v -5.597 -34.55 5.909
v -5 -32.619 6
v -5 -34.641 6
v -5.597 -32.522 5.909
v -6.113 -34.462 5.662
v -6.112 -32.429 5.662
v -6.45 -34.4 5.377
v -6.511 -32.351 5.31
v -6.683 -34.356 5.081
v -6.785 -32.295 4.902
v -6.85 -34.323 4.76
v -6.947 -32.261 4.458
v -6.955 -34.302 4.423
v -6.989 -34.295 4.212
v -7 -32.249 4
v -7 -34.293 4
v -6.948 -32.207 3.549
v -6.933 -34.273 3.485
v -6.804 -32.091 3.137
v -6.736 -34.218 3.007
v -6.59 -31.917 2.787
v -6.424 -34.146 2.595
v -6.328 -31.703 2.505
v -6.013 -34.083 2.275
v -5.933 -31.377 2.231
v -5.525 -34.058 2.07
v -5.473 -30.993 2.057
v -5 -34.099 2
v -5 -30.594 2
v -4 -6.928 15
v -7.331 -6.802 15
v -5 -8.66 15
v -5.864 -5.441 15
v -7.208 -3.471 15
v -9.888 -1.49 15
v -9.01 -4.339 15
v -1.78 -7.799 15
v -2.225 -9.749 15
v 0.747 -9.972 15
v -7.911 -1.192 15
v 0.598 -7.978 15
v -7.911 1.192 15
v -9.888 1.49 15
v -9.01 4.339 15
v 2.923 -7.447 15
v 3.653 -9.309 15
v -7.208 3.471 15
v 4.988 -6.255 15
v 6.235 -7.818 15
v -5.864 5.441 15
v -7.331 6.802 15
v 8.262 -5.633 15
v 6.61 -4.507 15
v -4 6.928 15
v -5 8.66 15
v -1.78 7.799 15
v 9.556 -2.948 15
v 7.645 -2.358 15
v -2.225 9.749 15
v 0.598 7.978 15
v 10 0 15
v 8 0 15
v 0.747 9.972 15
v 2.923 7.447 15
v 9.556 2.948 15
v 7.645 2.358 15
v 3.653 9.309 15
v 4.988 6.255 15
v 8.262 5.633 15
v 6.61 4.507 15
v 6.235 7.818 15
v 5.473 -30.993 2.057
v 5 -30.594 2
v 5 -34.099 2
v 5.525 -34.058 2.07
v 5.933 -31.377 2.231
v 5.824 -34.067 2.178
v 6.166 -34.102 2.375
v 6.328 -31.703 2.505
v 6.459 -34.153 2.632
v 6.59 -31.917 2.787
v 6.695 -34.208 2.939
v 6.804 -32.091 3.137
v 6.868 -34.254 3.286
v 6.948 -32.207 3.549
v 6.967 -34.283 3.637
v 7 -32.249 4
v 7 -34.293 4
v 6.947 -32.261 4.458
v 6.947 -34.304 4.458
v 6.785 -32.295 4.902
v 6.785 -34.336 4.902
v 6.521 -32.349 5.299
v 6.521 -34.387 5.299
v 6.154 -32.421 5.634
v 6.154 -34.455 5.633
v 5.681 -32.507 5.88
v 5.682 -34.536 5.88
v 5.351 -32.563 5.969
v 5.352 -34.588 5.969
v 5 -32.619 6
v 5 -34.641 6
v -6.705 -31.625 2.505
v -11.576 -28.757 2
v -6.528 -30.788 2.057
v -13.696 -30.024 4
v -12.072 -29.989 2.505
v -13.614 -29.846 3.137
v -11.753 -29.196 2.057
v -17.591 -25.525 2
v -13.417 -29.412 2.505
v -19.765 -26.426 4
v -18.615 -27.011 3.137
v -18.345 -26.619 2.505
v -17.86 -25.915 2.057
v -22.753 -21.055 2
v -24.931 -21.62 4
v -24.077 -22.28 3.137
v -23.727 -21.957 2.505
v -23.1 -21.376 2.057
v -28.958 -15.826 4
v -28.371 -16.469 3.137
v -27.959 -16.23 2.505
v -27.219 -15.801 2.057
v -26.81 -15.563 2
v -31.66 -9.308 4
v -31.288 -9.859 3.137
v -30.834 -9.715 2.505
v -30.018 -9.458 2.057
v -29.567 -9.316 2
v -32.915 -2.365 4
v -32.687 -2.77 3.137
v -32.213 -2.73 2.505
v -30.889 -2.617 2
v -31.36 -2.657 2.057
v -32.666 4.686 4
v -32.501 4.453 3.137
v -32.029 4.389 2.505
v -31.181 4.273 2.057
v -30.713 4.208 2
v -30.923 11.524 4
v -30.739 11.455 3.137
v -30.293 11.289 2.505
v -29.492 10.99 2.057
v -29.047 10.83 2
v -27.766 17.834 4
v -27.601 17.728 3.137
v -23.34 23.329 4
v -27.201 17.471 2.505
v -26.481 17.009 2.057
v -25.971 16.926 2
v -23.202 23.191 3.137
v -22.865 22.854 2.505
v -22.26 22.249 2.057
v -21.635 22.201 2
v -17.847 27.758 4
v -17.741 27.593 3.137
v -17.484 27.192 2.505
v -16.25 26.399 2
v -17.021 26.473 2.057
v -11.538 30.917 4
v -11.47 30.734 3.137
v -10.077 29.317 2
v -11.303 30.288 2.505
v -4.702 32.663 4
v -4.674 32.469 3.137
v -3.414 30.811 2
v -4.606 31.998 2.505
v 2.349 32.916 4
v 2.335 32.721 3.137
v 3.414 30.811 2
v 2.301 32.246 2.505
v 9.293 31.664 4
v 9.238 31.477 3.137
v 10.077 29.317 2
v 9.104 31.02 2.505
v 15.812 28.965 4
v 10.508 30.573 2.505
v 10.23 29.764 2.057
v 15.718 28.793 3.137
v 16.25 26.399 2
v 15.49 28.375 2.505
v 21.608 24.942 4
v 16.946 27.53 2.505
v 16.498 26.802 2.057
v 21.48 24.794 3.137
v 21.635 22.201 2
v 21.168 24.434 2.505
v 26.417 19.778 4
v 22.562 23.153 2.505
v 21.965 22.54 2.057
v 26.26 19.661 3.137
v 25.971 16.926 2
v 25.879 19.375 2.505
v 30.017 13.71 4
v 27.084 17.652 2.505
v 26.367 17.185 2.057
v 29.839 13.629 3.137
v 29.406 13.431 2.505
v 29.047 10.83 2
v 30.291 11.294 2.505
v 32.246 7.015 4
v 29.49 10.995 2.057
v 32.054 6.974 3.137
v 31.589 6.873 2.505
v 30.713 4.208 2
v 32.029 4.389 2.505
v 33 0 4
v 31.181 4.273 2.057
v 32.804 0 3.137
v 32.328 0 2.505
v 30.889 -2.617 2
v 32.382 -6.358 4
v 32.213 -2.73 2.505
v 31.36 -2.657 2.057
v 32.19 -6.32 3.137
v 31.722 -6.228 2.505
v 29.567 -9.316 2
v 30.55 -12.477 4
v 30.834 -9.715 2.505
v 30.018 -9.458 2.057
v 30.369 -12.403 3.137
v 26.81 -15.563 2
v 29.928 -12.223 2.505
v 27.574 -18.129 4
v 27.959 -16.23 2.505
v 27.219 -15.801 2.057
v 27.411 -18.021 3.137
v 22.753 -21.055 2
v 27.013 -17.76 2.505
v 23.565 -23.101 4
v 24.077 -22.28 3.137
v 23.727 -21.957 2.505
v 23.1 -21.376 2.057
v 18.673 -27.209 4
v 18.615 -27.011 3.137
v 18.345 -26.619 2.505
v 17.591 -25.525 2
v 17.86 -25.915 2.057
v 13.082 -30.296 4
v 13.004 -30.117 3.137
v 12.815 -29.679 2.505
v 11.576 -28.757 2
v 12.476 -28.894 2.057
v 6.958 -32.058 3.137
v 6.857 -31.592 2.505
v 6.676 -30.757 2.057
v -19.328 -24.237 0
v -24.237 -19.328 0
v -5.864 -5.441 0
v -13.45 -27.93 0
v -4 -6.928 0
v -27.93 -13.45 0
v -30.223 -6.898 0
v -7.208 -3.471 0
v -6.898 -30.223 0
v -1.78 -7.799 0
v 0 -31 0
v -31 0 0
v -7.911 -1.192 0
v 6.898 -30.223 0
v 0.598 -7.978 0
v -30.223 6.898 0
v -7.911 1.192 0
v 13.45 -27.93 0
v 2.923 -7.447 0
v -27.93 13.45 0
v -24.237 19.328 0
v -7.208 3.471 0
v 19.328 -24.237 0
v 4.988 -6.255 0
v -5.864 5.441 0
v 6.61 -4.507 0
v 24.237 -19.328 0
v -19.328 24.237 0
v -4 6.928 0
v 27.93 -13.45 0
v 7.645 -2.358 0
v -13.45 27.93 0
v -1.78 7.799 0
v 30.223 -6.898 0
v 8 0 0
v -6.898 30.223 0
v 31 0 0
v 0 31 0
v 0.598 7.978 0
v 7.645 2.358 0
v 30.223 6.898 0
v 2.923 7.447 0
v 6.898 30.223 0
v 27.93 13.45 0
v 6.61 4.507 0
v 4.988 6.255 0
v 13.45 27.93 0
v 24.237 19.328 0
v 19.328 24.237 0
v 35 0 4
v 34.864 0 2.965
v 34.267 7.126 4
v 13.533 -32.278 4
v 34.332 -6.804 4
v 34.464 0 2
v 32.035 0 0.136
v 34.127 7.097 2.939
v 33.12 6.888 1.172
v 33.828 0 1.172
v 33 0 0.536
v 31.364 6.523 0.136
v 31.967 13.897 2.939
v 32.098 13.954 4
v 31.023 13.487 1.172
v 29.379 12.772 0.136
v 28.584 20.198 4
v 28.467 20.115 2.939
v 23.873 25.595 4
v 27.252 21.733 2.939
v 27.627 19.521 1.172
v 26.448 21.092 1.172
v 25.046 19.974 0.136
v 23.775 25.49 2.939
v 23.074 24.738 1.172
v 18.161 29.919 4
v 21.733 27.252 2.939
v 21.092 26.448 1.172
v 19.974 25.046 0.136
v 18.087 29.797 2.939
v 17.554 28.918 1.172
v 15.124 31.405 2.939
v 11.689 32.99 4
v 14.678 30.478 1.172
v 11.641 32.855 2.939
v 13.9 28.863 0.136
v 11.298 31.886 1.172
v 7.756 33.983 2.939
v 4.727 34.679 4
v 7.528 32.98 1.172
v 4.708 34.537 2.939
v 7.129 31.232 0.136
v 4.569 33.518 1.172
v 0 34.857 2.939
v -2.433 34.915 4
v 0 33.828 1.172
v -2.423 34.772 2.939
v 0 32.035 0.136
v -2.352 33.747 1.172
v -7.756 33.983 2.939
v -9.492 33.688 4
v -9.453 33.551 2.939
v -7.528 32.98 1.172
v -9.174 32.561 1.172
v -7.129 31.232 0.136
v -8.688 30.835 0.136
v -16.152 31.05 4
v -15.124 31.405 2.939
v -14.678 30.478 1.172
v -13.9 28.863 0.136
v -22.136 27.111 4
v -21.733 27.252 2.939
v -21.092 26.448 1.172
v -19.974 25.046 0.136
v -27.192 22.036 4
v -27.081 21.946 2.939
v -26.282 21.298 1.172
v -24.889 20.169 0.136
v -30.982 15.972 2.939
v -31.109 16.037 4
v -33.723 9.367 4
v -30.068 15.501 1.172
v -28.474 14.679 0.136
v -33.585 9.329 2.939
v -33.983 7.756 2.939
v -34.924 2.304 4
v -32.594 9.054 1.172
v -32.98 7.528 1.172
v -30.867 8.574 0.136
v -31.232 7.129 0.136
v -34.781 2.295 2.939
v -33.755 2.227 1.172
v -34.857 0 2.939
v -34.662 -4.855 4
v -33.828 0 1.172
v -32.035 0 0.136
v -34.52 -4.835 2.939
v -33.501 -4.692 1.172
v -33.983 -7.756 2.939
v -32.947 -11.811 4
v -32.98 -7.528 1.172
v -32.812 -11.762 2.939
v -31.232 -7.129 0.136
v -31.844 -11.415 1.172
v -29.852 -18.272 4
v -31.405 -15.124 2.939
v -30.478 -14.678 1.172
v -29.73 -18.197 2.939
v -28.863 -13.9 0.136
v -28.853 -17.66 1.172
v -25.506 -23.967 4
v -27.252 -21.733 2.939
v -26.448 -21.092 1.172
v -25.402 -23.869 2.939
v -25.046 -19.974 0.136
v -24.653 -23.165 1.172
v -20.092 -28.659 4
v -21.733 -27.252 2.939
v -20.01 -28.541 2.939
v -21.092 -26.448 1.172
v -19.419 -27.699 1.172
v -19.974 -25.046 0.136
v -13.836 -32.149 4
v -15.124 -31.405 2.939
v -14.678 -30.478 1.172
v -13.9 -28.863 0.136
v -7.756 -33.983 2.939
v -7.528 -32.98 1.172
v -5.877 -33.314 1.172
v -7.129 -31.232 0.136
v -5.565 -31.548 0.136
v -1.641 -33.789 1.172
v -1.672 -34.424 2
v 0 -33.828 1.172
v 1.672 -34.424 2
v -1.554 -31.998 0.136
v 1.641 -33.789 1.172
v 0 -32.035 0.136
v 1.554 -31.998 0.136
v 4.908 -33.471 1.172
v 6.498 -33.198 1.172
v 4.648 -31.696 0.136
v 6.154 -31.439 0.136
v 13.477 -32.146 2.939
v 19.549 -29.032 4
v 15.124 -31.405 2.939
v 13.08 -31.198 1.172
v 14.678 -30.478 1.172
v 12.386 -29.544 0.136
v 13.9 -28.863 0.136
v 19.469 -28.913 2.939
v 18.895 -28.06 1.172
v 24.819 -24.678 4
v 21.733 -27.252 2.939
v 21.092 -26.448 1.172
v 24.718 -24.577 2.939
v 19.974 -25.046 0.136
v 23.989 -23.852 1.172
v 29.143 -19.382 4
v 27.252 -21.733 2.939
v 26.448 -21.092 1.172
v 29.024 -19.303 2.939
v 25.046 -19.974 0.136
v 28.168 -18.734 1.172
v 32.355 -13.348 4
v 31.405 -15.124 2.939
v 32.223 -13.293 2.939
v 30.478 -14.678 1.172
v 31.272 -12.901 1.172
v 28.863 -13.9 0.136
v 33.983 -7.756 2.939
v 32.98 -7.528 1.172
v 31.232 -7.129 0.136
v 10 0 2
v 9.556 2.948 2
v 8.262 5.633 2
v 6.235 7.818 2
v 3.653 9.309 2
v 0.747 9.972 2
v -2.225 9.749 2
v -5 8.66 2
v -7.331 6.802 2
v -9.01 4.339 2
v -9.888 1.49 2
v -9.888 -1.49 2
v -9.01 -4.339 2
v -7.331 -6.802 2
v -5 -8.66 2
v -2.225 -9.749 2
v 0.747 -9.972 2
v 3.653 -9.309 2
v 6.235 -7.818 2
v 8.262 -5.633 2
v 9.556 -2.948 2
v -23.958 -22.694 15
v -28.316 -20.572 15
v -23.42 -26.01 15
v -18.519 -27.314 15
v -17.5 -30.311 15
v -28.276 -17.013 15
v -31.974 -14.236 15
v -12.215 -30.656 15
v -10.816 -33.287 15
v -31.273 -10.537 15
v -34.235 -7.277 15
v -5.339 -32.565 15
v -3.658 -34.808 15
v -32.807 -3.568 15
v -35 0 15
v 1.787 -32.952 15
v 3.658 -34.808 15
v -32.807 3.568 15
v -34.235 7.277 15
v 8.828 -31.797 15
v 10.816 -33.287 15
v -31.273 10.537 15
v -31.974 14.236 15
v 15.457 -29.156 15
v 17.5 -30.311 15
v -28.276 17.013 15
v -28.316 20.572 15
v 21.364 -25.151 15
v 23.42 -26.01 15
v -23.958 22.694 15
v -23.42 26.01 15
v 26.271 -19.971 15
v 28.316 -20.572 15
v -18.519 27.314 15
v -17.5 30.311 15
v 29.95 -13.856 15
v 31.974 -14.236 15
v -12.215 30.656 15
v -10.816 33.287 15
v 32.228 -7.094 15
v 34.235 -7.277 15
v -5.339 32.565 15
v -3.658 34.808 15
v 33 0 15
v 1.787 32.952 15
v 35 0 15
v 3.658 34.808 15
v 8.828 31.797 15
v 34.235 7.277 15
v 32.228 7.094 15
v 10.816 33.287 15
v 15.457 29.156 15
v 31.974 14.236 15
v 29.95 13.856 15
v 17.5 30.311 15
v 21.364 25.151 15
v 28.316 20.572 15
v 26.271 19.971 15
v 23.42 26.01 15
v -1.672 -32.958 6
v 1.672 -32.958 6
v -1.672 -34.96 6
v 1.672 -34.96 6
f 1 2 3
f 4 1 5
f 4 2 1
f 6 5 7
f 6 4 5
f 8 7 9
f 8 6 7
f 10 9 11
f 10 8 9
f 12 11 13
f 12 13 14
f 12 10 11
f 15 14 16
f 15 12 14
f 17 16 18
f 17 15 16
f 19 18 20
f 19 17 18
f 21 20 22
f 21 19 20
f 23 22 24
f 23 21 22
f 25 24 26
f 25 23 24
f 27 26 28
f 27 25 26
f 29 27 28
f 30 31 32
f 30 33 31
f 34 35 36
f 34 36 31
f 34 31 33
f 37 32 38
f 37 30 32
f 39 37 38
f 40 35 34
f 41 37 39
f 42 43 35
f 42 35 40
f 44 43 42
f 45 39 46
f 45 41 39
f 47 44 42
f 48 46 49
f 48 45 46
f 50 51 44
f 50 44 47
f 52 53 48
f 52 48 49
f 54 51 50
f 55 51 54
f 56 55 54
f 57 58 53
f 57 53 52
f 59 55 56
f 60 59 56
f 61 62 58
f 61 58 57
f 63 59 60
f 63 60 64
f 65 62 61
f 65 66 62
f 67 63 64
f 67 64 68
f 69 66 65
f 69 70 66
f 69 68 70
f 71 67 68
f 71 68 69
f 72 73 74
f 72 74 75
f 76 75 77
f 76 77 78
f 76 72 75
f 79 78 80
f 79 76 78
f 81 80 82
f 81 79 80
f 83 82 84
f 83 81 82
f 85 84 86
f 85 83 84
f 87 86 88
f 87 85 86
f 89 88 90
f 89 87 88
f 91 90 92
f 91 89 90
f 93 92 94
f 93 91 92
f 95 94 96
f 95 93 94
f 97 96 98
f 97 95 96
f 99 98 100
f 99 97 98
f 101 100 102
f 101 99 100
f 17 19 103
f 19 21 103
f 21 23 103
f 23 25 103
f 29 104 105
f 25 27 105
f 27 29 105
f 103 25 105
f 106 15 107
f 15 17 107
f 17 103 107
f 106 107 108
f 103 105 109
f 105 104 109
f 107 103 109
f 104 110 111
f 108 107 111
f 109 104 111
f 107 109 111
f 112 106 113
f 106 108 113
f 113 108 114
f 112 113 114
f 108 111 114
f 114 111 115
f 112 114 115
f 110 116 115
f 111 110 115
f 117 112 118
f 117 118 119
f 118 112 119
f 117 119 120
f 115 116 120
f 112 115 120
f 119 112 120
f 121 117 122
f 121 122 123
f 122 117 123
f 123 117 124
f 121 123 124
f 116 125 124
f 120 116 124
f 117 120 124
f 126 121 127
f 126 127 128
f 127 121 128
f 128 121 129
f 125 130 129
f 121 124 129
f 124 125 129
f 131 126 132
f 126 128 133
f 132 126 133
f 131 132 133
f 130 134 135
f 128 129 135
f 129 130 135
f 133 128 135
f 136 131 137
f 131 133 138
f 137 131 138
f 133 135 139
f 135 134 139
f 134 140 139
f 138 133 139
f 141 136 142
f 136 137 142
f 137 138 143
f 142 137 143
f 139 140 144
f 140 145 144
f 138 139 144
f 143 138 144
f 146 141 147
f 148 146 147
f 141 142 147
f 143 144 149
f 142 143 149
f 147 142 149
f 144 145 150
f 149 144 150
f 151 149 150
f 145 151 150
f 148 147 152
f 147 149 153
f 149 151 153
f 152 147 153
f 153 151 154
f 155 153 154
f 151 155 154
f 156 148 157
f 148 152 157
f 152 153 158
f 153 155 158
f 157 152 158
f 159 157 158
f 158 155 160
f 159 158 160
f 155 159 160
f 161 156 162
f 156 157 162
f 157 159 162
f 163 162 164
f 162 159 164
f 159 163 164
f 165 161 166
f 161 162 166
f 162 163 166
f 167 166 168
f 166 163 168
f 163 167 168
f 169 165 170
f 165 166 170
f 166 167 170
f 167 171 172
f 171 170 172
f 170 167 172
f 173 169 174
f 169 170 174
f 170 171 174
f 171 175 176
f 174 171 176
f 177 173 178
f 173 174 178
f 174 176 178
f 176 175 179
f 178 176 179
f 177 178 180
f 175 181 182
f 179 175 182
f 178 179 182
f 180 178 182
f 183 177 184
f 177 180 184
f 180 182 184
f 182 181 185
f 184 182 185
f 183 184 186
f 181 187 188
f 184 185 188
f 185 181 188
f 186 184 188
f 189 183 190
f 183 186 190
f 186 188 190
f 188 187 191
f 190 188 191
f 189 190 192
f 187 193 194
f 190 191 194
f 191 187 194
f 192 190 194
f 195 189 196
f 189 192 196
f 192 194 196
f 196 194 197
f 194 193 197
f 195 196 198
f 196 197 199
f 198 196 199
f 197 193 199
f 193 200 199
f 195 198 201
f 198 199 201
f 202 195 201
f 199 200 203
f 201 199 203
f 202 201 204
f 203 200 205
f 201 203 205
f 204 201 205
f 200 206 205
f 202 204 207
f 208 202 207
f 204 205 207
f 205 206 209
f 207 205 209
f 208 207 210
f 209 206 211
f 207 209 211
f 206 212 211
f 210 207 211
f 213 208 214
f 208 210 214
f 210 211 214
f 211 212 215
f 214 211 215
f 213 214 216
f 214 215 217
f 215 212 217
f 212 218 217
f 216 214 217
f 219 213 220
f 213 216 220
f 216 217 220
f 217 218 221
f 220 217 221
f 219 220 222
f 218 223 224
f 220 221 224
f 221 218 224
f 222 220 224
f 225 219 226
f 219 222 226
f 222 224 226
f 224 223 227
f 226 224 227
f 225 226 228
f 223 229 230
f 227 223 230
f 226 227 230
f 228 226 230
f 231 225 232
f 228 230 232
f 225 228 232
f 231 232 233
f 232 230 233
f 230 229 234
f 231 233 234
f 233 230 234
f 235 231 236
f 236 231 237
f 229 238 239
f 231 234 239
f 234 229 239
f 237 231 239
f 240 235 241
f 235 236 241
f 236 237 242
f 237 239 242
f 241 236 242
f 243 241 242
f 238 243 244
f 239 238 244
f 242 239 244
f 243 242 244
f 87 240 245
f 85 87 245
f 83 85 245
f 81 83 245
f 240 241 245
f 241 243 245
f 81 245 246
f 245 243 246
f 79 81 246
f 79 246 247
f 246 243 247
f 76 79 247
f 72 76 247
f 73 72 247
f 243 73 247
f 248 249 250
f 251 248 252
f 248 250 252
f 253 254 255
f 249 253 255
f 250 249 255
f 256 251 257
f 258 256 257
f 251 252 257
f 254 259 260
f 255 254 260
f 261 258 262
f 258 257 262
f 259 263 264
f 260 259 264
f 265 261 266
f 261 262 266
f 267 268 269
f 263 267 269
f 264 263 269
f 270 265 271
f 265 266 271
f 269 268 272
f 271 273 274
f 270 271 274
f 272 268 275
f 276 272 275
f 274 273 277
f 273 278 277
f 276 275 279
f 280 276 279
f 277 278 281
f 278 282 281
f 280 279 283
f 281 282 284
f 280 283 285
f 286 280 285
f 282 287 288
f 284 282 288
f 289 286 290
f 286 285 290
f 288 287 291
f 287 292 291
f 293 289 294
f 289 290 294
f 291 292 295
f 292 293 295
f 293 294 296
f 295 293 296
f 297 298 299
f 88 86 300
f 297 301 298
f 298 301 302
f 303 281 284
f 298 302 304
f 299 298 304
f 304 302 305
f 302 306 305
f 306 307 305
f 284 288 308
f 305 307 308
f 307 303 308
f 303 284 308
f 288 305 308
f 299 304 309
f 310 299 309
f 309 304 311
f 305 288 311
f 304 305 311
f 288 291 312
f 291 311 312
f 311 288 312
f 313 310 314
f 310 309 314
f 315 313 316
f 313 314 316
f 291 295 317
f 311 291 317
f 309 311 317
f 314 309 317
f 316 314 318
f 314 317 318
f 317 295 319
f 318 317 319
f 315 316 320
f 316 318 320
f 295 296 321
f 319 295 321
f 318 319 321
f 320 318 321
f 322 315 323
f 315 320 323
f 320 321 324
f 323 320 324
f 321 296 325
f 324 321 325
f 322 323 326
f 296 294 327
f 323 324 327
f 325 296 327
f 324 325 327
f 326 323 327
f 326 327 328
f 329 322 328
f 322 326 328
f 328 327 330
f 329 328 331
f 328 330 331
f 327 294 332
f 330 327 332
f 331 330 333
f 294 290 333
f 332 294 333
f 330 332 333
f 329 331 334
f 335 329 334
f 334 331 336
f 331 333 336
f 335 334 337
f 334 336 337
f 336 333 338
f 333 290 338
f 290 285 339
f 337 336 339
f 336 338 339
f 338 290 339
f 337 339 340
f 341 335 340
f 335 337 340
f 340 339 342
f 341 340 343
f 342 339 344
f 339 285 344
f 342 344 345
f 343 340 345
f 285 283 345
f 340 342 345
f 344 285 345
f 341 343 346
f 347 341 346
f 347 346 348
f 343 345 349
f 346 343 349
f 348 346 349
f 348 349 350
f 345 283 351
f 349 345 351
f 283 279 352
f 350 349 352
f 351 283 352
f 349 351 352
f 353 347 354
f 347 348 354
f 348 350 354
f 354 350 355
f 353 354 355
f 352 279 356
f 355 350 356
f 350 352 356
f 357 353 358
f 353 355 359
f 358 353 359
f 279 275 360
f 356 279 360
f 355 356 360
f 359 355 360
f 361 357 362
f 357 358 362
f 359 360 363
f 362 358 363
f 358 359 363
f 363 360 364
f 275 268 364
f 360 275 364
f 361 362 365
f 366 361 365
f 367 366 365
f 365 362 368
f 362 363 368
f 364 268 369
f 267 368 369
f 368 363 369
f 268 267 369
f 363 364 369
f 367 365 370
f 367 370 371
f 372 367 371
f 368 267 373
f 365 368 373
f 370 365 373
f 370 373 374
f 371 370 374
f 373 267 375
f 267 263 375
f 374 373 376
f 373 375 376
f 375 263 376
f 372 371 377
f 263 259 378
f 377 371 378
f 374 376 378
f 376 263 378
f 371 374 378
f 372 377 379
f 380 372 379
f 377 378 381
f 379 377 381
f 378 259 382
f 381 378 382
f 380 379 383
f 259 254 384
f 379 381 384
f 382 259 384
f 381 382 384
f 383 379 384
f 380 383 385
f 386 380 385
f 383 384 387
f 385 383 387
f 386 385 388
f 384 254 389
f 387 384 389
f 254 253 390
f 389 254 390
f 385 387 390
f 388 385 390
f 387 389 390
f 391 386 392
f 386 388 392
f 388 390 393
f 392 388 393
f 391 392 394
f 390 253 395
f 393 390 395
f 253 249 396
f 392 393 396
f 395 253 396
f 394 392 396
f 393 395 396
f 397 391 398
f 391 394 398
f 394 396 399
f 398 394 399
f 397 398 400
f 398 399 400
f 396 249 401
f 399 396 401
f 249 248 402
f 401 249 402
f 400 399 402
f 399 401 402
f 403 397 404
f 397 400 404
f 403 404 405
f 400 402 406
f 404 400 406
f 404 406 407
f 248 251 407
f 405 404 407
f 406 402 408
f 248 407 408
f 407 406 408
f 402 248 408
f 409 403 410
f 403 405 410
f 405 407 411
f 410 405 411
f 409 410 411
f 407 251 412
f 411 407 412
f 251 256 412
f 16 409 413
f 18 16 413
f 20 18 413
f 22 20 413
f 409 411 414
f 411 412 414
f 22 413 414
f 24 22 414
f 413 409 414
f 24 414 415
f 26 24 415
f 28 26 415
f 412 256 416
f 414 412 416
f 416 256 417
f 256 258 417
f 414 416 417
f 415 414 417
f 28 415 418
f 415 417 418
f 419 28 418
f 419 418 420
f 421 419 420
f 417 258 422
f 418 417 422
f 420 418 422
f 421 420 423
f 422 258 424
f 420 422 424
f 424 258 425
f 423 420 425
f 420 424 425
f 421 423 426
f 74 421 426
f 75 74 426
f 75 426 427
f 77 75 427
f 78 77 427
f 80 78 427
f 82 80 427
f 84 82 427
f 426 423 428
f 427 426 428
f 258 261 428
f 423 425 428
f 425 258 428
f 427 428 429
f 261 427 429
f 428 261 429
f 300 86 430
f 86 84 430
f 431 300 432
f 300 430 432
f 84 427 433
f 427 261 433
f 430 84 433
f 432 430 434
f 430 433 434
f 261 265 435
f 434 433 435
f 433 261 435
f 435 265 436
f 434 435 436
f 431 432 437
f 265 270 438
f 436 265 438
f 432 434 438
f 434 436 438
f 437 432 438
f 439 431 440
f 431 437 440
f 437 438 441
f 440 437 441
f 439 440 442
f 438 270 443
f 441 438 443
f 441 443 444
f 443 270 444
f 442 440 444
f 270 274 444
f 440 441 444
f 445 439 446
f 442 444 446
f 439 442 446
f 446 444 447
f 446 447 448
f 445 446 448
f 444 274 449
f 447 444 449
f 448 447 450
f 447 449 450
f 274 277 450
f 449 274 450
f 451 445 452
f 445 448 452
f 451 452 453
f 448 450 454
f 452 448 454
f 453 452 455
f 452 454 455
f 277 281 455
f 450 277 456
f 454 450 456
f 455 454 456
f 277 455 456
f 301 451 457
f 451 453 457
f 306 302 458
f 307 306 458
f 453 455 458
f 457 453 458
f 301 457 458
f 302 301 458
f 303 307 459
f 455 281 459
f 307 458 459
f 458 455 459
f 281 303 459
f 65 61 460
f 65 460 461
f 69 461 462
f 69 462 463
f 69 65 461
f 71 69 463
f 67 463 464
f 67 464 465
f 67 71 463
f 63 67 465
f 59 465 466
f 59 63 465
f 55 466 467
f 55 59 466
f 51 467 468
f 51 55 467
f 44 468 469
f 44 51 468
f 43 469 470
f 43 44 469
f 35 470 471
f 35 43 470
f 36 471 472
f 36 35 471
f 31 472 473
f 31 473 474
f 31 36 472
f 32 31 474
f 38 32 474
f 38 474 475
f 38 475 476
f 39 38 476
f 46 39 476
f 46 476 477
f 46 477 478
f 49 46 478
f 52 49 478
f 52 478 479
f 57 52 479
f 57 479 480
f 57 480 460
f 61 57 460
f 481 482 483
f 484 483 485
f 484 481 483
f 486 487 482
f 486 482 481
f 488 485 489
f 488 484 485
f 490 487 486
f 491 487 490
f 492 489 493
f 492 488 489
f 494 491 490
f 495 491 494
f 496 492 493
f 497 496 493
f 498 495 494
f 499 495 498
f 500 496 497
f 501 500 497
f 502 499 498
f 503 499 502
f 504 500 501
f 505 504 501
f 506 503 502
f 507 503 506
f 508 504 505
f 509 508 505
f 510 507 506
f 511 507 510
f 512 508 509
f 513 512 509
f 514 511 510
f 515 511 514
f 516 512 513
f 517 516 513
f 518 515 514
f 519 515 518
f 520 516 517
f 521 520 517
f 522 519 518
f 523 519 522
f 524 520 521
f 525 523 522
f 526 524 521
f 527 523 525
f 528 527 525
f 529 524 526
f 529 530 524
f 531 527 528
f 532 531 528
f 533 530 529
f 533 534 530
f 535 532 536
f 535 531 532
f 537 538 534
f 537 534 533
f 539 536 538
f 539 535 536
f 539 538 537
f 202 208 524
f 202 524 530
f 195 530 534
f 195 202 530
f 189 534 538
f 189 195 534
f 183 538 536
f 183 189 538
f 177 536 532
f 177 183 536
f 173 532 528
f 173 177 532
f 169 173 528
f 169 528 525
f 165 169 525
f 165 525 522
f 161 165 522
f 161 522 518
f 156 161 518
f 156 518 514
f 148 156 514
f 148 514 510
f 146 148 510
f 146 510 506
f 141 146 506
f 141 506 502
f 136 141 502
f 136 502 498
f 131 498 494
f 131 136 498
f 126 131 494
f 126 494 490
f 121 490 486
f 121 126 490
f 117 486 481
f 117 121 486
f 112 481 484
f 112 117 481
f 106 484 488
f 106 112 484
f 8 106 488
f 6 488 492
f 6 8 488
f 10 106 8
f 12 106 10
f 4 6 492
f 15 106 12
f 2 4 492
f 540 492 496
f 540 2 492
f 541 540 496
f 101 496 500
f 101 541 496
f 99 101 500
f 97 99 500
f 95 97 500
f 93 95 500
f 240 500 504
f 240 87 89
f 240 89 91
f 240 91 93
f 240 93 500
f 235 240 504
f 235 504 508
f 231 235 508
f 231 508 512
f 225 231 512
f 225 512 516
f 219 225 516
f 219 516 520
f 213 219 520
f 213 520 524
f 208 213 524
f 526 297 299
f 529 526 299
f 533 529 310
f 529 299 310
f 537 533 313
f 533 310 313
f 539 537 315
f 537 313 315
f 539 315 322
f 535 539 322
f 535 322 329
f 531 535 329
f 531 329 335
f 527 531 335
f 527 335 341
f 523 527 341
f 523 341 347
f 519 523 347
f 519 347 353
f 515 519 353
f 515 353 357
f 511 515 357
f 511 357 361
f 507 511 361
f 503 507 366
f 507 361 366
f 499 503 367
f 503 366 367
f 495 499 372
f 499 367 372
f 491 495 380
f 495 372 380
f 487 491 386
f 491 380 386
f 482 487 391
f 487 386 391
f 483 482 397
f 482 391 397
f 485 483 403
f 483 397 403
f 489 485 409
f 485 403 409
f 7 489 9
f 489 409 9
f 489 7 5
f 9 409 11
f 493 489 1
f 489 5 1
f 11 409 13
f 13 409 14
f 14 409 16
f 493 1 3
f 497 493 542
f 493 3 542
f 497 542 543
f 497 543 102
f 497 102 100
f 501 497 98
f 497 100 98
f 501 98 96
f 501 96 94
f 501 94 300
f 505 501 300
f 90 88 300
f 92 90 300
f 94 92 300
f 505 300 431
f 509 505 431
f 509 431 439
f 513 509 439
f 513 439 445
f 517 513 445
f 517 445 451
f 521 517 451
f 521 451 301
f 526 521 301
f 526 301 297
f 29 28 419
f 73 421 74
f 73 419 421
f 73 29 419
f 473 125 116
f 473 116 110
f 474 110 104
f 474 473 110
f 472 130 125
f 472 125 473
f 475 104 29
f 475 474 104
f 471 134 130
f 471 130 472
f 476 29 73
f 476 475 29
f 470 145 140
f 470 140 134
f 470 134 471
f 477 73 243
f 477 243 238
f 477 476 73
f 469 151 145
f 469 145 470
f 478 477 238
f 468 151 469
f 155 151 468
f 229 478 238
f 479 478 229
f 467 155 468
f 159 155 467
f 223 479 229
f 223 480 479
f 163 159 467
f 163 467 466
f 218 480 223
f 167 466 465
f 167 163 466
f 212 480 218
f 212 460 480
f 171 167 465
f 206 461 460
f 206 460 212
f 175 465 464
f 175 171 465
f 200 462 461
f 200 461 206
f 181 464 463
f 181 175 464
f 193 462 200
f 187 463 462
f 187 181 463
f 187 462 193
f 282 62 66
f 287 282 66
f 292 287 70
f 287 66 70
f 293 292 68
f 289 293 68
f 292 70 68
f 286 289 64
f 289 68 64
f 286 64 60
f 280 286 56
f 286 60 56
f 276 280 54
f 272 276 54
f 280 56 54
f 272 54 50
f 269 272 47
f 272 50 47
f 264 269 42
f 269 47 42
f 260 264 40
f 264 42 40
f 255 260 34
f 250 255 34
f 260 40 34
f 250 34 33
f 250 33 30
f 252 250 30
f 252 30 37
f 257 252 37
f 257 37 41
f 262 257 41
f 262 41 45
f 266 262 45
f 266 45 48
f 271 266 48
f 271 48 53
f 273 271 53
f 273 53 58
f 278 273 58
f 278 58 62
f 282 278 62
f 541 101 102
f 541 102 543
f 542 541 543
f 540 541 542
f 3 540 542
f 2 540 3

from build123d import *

# Parameters (mm, degrees)
CROQUIS1_R              = 35
SALIENTE_EXTRUIR1_DEPTH = 15
CROQUIS2_R              = 8
CORTAR_EXTRUIR1_DEPTH   = 52.720402164
VACIADO1_T              = -2
REDONDEO1_R             = 2
REDONDEO2_R             = 4
CORTAR_EXTRUIR2_START   = -25
CORTAR_EXTRUIR2_DEPTH   = 27.720402164


with BuildPart() as part:
    # Croquis1 → Saliente-Extruir1 (new body)
    with BuildSketch(Plane.XY):
        Circle(CROQUIS1_R)
    extrude(amount=SALIENTE_EXTRUIR1_DEPTH)

    # Croquis2 → Cortar-Extruir1 (cut, through all)
    with BuildSketch(Plane.XY.offset(15)):
        Circle(CROQUIS2_R)
    extrude(amount=-CORTAR_EXTRUIR1_DEPTH, mode=Mode.SUBTRACT)

    # Vaciado1
    vaciado1_openings = [part.faces().sort_by_distance(p)[0] for p in [
        (-34.010050506, 0, 15),
    ]]
    offset(amount=VACIADO1_T, openings=vaciado1_openings, kind=Kind.INTERSECTION)

    # Redondeo1
    redondeo1_edges = [part.edges().sort_by_distance(p)[0] for p in [
        (-33, 0, 2),
    ]]
    fillet(redondeo1_edges, radius=REDONDEO1_R)

    # Redondeo2
    redondeo2_edges = [part.edges().sort_by_distance(p)[0] for p in [
        (-35, 0, 0),
    ]]
    fillet(redondeo2_edges, radius=REDONDEO2_R)

    # Croquis3 → Cortar-Extruir2 (cut, through all)
    with BuildSketch(Plane(origin=(0, 0, 0), x_dir=(1, 0, 0), z_dir=(0, 1, 0)).offset(CORTAR_EXTRUIR2_START)):
        with BuildLine():
            Line((-5, -2), (5, -2))
            ThreePointArc((5, -2), (7, -4), (5, -6))
            Line((5, -6), (-5, -6))
            ThreePointArc((-5, -6), (-7, -4), (-5, -2))
        make_face()
    extrude(amount=-CORTAR_EXTRUIR2_DEPTH, mode=Mode.SUBTRACT)


solid = part.part
